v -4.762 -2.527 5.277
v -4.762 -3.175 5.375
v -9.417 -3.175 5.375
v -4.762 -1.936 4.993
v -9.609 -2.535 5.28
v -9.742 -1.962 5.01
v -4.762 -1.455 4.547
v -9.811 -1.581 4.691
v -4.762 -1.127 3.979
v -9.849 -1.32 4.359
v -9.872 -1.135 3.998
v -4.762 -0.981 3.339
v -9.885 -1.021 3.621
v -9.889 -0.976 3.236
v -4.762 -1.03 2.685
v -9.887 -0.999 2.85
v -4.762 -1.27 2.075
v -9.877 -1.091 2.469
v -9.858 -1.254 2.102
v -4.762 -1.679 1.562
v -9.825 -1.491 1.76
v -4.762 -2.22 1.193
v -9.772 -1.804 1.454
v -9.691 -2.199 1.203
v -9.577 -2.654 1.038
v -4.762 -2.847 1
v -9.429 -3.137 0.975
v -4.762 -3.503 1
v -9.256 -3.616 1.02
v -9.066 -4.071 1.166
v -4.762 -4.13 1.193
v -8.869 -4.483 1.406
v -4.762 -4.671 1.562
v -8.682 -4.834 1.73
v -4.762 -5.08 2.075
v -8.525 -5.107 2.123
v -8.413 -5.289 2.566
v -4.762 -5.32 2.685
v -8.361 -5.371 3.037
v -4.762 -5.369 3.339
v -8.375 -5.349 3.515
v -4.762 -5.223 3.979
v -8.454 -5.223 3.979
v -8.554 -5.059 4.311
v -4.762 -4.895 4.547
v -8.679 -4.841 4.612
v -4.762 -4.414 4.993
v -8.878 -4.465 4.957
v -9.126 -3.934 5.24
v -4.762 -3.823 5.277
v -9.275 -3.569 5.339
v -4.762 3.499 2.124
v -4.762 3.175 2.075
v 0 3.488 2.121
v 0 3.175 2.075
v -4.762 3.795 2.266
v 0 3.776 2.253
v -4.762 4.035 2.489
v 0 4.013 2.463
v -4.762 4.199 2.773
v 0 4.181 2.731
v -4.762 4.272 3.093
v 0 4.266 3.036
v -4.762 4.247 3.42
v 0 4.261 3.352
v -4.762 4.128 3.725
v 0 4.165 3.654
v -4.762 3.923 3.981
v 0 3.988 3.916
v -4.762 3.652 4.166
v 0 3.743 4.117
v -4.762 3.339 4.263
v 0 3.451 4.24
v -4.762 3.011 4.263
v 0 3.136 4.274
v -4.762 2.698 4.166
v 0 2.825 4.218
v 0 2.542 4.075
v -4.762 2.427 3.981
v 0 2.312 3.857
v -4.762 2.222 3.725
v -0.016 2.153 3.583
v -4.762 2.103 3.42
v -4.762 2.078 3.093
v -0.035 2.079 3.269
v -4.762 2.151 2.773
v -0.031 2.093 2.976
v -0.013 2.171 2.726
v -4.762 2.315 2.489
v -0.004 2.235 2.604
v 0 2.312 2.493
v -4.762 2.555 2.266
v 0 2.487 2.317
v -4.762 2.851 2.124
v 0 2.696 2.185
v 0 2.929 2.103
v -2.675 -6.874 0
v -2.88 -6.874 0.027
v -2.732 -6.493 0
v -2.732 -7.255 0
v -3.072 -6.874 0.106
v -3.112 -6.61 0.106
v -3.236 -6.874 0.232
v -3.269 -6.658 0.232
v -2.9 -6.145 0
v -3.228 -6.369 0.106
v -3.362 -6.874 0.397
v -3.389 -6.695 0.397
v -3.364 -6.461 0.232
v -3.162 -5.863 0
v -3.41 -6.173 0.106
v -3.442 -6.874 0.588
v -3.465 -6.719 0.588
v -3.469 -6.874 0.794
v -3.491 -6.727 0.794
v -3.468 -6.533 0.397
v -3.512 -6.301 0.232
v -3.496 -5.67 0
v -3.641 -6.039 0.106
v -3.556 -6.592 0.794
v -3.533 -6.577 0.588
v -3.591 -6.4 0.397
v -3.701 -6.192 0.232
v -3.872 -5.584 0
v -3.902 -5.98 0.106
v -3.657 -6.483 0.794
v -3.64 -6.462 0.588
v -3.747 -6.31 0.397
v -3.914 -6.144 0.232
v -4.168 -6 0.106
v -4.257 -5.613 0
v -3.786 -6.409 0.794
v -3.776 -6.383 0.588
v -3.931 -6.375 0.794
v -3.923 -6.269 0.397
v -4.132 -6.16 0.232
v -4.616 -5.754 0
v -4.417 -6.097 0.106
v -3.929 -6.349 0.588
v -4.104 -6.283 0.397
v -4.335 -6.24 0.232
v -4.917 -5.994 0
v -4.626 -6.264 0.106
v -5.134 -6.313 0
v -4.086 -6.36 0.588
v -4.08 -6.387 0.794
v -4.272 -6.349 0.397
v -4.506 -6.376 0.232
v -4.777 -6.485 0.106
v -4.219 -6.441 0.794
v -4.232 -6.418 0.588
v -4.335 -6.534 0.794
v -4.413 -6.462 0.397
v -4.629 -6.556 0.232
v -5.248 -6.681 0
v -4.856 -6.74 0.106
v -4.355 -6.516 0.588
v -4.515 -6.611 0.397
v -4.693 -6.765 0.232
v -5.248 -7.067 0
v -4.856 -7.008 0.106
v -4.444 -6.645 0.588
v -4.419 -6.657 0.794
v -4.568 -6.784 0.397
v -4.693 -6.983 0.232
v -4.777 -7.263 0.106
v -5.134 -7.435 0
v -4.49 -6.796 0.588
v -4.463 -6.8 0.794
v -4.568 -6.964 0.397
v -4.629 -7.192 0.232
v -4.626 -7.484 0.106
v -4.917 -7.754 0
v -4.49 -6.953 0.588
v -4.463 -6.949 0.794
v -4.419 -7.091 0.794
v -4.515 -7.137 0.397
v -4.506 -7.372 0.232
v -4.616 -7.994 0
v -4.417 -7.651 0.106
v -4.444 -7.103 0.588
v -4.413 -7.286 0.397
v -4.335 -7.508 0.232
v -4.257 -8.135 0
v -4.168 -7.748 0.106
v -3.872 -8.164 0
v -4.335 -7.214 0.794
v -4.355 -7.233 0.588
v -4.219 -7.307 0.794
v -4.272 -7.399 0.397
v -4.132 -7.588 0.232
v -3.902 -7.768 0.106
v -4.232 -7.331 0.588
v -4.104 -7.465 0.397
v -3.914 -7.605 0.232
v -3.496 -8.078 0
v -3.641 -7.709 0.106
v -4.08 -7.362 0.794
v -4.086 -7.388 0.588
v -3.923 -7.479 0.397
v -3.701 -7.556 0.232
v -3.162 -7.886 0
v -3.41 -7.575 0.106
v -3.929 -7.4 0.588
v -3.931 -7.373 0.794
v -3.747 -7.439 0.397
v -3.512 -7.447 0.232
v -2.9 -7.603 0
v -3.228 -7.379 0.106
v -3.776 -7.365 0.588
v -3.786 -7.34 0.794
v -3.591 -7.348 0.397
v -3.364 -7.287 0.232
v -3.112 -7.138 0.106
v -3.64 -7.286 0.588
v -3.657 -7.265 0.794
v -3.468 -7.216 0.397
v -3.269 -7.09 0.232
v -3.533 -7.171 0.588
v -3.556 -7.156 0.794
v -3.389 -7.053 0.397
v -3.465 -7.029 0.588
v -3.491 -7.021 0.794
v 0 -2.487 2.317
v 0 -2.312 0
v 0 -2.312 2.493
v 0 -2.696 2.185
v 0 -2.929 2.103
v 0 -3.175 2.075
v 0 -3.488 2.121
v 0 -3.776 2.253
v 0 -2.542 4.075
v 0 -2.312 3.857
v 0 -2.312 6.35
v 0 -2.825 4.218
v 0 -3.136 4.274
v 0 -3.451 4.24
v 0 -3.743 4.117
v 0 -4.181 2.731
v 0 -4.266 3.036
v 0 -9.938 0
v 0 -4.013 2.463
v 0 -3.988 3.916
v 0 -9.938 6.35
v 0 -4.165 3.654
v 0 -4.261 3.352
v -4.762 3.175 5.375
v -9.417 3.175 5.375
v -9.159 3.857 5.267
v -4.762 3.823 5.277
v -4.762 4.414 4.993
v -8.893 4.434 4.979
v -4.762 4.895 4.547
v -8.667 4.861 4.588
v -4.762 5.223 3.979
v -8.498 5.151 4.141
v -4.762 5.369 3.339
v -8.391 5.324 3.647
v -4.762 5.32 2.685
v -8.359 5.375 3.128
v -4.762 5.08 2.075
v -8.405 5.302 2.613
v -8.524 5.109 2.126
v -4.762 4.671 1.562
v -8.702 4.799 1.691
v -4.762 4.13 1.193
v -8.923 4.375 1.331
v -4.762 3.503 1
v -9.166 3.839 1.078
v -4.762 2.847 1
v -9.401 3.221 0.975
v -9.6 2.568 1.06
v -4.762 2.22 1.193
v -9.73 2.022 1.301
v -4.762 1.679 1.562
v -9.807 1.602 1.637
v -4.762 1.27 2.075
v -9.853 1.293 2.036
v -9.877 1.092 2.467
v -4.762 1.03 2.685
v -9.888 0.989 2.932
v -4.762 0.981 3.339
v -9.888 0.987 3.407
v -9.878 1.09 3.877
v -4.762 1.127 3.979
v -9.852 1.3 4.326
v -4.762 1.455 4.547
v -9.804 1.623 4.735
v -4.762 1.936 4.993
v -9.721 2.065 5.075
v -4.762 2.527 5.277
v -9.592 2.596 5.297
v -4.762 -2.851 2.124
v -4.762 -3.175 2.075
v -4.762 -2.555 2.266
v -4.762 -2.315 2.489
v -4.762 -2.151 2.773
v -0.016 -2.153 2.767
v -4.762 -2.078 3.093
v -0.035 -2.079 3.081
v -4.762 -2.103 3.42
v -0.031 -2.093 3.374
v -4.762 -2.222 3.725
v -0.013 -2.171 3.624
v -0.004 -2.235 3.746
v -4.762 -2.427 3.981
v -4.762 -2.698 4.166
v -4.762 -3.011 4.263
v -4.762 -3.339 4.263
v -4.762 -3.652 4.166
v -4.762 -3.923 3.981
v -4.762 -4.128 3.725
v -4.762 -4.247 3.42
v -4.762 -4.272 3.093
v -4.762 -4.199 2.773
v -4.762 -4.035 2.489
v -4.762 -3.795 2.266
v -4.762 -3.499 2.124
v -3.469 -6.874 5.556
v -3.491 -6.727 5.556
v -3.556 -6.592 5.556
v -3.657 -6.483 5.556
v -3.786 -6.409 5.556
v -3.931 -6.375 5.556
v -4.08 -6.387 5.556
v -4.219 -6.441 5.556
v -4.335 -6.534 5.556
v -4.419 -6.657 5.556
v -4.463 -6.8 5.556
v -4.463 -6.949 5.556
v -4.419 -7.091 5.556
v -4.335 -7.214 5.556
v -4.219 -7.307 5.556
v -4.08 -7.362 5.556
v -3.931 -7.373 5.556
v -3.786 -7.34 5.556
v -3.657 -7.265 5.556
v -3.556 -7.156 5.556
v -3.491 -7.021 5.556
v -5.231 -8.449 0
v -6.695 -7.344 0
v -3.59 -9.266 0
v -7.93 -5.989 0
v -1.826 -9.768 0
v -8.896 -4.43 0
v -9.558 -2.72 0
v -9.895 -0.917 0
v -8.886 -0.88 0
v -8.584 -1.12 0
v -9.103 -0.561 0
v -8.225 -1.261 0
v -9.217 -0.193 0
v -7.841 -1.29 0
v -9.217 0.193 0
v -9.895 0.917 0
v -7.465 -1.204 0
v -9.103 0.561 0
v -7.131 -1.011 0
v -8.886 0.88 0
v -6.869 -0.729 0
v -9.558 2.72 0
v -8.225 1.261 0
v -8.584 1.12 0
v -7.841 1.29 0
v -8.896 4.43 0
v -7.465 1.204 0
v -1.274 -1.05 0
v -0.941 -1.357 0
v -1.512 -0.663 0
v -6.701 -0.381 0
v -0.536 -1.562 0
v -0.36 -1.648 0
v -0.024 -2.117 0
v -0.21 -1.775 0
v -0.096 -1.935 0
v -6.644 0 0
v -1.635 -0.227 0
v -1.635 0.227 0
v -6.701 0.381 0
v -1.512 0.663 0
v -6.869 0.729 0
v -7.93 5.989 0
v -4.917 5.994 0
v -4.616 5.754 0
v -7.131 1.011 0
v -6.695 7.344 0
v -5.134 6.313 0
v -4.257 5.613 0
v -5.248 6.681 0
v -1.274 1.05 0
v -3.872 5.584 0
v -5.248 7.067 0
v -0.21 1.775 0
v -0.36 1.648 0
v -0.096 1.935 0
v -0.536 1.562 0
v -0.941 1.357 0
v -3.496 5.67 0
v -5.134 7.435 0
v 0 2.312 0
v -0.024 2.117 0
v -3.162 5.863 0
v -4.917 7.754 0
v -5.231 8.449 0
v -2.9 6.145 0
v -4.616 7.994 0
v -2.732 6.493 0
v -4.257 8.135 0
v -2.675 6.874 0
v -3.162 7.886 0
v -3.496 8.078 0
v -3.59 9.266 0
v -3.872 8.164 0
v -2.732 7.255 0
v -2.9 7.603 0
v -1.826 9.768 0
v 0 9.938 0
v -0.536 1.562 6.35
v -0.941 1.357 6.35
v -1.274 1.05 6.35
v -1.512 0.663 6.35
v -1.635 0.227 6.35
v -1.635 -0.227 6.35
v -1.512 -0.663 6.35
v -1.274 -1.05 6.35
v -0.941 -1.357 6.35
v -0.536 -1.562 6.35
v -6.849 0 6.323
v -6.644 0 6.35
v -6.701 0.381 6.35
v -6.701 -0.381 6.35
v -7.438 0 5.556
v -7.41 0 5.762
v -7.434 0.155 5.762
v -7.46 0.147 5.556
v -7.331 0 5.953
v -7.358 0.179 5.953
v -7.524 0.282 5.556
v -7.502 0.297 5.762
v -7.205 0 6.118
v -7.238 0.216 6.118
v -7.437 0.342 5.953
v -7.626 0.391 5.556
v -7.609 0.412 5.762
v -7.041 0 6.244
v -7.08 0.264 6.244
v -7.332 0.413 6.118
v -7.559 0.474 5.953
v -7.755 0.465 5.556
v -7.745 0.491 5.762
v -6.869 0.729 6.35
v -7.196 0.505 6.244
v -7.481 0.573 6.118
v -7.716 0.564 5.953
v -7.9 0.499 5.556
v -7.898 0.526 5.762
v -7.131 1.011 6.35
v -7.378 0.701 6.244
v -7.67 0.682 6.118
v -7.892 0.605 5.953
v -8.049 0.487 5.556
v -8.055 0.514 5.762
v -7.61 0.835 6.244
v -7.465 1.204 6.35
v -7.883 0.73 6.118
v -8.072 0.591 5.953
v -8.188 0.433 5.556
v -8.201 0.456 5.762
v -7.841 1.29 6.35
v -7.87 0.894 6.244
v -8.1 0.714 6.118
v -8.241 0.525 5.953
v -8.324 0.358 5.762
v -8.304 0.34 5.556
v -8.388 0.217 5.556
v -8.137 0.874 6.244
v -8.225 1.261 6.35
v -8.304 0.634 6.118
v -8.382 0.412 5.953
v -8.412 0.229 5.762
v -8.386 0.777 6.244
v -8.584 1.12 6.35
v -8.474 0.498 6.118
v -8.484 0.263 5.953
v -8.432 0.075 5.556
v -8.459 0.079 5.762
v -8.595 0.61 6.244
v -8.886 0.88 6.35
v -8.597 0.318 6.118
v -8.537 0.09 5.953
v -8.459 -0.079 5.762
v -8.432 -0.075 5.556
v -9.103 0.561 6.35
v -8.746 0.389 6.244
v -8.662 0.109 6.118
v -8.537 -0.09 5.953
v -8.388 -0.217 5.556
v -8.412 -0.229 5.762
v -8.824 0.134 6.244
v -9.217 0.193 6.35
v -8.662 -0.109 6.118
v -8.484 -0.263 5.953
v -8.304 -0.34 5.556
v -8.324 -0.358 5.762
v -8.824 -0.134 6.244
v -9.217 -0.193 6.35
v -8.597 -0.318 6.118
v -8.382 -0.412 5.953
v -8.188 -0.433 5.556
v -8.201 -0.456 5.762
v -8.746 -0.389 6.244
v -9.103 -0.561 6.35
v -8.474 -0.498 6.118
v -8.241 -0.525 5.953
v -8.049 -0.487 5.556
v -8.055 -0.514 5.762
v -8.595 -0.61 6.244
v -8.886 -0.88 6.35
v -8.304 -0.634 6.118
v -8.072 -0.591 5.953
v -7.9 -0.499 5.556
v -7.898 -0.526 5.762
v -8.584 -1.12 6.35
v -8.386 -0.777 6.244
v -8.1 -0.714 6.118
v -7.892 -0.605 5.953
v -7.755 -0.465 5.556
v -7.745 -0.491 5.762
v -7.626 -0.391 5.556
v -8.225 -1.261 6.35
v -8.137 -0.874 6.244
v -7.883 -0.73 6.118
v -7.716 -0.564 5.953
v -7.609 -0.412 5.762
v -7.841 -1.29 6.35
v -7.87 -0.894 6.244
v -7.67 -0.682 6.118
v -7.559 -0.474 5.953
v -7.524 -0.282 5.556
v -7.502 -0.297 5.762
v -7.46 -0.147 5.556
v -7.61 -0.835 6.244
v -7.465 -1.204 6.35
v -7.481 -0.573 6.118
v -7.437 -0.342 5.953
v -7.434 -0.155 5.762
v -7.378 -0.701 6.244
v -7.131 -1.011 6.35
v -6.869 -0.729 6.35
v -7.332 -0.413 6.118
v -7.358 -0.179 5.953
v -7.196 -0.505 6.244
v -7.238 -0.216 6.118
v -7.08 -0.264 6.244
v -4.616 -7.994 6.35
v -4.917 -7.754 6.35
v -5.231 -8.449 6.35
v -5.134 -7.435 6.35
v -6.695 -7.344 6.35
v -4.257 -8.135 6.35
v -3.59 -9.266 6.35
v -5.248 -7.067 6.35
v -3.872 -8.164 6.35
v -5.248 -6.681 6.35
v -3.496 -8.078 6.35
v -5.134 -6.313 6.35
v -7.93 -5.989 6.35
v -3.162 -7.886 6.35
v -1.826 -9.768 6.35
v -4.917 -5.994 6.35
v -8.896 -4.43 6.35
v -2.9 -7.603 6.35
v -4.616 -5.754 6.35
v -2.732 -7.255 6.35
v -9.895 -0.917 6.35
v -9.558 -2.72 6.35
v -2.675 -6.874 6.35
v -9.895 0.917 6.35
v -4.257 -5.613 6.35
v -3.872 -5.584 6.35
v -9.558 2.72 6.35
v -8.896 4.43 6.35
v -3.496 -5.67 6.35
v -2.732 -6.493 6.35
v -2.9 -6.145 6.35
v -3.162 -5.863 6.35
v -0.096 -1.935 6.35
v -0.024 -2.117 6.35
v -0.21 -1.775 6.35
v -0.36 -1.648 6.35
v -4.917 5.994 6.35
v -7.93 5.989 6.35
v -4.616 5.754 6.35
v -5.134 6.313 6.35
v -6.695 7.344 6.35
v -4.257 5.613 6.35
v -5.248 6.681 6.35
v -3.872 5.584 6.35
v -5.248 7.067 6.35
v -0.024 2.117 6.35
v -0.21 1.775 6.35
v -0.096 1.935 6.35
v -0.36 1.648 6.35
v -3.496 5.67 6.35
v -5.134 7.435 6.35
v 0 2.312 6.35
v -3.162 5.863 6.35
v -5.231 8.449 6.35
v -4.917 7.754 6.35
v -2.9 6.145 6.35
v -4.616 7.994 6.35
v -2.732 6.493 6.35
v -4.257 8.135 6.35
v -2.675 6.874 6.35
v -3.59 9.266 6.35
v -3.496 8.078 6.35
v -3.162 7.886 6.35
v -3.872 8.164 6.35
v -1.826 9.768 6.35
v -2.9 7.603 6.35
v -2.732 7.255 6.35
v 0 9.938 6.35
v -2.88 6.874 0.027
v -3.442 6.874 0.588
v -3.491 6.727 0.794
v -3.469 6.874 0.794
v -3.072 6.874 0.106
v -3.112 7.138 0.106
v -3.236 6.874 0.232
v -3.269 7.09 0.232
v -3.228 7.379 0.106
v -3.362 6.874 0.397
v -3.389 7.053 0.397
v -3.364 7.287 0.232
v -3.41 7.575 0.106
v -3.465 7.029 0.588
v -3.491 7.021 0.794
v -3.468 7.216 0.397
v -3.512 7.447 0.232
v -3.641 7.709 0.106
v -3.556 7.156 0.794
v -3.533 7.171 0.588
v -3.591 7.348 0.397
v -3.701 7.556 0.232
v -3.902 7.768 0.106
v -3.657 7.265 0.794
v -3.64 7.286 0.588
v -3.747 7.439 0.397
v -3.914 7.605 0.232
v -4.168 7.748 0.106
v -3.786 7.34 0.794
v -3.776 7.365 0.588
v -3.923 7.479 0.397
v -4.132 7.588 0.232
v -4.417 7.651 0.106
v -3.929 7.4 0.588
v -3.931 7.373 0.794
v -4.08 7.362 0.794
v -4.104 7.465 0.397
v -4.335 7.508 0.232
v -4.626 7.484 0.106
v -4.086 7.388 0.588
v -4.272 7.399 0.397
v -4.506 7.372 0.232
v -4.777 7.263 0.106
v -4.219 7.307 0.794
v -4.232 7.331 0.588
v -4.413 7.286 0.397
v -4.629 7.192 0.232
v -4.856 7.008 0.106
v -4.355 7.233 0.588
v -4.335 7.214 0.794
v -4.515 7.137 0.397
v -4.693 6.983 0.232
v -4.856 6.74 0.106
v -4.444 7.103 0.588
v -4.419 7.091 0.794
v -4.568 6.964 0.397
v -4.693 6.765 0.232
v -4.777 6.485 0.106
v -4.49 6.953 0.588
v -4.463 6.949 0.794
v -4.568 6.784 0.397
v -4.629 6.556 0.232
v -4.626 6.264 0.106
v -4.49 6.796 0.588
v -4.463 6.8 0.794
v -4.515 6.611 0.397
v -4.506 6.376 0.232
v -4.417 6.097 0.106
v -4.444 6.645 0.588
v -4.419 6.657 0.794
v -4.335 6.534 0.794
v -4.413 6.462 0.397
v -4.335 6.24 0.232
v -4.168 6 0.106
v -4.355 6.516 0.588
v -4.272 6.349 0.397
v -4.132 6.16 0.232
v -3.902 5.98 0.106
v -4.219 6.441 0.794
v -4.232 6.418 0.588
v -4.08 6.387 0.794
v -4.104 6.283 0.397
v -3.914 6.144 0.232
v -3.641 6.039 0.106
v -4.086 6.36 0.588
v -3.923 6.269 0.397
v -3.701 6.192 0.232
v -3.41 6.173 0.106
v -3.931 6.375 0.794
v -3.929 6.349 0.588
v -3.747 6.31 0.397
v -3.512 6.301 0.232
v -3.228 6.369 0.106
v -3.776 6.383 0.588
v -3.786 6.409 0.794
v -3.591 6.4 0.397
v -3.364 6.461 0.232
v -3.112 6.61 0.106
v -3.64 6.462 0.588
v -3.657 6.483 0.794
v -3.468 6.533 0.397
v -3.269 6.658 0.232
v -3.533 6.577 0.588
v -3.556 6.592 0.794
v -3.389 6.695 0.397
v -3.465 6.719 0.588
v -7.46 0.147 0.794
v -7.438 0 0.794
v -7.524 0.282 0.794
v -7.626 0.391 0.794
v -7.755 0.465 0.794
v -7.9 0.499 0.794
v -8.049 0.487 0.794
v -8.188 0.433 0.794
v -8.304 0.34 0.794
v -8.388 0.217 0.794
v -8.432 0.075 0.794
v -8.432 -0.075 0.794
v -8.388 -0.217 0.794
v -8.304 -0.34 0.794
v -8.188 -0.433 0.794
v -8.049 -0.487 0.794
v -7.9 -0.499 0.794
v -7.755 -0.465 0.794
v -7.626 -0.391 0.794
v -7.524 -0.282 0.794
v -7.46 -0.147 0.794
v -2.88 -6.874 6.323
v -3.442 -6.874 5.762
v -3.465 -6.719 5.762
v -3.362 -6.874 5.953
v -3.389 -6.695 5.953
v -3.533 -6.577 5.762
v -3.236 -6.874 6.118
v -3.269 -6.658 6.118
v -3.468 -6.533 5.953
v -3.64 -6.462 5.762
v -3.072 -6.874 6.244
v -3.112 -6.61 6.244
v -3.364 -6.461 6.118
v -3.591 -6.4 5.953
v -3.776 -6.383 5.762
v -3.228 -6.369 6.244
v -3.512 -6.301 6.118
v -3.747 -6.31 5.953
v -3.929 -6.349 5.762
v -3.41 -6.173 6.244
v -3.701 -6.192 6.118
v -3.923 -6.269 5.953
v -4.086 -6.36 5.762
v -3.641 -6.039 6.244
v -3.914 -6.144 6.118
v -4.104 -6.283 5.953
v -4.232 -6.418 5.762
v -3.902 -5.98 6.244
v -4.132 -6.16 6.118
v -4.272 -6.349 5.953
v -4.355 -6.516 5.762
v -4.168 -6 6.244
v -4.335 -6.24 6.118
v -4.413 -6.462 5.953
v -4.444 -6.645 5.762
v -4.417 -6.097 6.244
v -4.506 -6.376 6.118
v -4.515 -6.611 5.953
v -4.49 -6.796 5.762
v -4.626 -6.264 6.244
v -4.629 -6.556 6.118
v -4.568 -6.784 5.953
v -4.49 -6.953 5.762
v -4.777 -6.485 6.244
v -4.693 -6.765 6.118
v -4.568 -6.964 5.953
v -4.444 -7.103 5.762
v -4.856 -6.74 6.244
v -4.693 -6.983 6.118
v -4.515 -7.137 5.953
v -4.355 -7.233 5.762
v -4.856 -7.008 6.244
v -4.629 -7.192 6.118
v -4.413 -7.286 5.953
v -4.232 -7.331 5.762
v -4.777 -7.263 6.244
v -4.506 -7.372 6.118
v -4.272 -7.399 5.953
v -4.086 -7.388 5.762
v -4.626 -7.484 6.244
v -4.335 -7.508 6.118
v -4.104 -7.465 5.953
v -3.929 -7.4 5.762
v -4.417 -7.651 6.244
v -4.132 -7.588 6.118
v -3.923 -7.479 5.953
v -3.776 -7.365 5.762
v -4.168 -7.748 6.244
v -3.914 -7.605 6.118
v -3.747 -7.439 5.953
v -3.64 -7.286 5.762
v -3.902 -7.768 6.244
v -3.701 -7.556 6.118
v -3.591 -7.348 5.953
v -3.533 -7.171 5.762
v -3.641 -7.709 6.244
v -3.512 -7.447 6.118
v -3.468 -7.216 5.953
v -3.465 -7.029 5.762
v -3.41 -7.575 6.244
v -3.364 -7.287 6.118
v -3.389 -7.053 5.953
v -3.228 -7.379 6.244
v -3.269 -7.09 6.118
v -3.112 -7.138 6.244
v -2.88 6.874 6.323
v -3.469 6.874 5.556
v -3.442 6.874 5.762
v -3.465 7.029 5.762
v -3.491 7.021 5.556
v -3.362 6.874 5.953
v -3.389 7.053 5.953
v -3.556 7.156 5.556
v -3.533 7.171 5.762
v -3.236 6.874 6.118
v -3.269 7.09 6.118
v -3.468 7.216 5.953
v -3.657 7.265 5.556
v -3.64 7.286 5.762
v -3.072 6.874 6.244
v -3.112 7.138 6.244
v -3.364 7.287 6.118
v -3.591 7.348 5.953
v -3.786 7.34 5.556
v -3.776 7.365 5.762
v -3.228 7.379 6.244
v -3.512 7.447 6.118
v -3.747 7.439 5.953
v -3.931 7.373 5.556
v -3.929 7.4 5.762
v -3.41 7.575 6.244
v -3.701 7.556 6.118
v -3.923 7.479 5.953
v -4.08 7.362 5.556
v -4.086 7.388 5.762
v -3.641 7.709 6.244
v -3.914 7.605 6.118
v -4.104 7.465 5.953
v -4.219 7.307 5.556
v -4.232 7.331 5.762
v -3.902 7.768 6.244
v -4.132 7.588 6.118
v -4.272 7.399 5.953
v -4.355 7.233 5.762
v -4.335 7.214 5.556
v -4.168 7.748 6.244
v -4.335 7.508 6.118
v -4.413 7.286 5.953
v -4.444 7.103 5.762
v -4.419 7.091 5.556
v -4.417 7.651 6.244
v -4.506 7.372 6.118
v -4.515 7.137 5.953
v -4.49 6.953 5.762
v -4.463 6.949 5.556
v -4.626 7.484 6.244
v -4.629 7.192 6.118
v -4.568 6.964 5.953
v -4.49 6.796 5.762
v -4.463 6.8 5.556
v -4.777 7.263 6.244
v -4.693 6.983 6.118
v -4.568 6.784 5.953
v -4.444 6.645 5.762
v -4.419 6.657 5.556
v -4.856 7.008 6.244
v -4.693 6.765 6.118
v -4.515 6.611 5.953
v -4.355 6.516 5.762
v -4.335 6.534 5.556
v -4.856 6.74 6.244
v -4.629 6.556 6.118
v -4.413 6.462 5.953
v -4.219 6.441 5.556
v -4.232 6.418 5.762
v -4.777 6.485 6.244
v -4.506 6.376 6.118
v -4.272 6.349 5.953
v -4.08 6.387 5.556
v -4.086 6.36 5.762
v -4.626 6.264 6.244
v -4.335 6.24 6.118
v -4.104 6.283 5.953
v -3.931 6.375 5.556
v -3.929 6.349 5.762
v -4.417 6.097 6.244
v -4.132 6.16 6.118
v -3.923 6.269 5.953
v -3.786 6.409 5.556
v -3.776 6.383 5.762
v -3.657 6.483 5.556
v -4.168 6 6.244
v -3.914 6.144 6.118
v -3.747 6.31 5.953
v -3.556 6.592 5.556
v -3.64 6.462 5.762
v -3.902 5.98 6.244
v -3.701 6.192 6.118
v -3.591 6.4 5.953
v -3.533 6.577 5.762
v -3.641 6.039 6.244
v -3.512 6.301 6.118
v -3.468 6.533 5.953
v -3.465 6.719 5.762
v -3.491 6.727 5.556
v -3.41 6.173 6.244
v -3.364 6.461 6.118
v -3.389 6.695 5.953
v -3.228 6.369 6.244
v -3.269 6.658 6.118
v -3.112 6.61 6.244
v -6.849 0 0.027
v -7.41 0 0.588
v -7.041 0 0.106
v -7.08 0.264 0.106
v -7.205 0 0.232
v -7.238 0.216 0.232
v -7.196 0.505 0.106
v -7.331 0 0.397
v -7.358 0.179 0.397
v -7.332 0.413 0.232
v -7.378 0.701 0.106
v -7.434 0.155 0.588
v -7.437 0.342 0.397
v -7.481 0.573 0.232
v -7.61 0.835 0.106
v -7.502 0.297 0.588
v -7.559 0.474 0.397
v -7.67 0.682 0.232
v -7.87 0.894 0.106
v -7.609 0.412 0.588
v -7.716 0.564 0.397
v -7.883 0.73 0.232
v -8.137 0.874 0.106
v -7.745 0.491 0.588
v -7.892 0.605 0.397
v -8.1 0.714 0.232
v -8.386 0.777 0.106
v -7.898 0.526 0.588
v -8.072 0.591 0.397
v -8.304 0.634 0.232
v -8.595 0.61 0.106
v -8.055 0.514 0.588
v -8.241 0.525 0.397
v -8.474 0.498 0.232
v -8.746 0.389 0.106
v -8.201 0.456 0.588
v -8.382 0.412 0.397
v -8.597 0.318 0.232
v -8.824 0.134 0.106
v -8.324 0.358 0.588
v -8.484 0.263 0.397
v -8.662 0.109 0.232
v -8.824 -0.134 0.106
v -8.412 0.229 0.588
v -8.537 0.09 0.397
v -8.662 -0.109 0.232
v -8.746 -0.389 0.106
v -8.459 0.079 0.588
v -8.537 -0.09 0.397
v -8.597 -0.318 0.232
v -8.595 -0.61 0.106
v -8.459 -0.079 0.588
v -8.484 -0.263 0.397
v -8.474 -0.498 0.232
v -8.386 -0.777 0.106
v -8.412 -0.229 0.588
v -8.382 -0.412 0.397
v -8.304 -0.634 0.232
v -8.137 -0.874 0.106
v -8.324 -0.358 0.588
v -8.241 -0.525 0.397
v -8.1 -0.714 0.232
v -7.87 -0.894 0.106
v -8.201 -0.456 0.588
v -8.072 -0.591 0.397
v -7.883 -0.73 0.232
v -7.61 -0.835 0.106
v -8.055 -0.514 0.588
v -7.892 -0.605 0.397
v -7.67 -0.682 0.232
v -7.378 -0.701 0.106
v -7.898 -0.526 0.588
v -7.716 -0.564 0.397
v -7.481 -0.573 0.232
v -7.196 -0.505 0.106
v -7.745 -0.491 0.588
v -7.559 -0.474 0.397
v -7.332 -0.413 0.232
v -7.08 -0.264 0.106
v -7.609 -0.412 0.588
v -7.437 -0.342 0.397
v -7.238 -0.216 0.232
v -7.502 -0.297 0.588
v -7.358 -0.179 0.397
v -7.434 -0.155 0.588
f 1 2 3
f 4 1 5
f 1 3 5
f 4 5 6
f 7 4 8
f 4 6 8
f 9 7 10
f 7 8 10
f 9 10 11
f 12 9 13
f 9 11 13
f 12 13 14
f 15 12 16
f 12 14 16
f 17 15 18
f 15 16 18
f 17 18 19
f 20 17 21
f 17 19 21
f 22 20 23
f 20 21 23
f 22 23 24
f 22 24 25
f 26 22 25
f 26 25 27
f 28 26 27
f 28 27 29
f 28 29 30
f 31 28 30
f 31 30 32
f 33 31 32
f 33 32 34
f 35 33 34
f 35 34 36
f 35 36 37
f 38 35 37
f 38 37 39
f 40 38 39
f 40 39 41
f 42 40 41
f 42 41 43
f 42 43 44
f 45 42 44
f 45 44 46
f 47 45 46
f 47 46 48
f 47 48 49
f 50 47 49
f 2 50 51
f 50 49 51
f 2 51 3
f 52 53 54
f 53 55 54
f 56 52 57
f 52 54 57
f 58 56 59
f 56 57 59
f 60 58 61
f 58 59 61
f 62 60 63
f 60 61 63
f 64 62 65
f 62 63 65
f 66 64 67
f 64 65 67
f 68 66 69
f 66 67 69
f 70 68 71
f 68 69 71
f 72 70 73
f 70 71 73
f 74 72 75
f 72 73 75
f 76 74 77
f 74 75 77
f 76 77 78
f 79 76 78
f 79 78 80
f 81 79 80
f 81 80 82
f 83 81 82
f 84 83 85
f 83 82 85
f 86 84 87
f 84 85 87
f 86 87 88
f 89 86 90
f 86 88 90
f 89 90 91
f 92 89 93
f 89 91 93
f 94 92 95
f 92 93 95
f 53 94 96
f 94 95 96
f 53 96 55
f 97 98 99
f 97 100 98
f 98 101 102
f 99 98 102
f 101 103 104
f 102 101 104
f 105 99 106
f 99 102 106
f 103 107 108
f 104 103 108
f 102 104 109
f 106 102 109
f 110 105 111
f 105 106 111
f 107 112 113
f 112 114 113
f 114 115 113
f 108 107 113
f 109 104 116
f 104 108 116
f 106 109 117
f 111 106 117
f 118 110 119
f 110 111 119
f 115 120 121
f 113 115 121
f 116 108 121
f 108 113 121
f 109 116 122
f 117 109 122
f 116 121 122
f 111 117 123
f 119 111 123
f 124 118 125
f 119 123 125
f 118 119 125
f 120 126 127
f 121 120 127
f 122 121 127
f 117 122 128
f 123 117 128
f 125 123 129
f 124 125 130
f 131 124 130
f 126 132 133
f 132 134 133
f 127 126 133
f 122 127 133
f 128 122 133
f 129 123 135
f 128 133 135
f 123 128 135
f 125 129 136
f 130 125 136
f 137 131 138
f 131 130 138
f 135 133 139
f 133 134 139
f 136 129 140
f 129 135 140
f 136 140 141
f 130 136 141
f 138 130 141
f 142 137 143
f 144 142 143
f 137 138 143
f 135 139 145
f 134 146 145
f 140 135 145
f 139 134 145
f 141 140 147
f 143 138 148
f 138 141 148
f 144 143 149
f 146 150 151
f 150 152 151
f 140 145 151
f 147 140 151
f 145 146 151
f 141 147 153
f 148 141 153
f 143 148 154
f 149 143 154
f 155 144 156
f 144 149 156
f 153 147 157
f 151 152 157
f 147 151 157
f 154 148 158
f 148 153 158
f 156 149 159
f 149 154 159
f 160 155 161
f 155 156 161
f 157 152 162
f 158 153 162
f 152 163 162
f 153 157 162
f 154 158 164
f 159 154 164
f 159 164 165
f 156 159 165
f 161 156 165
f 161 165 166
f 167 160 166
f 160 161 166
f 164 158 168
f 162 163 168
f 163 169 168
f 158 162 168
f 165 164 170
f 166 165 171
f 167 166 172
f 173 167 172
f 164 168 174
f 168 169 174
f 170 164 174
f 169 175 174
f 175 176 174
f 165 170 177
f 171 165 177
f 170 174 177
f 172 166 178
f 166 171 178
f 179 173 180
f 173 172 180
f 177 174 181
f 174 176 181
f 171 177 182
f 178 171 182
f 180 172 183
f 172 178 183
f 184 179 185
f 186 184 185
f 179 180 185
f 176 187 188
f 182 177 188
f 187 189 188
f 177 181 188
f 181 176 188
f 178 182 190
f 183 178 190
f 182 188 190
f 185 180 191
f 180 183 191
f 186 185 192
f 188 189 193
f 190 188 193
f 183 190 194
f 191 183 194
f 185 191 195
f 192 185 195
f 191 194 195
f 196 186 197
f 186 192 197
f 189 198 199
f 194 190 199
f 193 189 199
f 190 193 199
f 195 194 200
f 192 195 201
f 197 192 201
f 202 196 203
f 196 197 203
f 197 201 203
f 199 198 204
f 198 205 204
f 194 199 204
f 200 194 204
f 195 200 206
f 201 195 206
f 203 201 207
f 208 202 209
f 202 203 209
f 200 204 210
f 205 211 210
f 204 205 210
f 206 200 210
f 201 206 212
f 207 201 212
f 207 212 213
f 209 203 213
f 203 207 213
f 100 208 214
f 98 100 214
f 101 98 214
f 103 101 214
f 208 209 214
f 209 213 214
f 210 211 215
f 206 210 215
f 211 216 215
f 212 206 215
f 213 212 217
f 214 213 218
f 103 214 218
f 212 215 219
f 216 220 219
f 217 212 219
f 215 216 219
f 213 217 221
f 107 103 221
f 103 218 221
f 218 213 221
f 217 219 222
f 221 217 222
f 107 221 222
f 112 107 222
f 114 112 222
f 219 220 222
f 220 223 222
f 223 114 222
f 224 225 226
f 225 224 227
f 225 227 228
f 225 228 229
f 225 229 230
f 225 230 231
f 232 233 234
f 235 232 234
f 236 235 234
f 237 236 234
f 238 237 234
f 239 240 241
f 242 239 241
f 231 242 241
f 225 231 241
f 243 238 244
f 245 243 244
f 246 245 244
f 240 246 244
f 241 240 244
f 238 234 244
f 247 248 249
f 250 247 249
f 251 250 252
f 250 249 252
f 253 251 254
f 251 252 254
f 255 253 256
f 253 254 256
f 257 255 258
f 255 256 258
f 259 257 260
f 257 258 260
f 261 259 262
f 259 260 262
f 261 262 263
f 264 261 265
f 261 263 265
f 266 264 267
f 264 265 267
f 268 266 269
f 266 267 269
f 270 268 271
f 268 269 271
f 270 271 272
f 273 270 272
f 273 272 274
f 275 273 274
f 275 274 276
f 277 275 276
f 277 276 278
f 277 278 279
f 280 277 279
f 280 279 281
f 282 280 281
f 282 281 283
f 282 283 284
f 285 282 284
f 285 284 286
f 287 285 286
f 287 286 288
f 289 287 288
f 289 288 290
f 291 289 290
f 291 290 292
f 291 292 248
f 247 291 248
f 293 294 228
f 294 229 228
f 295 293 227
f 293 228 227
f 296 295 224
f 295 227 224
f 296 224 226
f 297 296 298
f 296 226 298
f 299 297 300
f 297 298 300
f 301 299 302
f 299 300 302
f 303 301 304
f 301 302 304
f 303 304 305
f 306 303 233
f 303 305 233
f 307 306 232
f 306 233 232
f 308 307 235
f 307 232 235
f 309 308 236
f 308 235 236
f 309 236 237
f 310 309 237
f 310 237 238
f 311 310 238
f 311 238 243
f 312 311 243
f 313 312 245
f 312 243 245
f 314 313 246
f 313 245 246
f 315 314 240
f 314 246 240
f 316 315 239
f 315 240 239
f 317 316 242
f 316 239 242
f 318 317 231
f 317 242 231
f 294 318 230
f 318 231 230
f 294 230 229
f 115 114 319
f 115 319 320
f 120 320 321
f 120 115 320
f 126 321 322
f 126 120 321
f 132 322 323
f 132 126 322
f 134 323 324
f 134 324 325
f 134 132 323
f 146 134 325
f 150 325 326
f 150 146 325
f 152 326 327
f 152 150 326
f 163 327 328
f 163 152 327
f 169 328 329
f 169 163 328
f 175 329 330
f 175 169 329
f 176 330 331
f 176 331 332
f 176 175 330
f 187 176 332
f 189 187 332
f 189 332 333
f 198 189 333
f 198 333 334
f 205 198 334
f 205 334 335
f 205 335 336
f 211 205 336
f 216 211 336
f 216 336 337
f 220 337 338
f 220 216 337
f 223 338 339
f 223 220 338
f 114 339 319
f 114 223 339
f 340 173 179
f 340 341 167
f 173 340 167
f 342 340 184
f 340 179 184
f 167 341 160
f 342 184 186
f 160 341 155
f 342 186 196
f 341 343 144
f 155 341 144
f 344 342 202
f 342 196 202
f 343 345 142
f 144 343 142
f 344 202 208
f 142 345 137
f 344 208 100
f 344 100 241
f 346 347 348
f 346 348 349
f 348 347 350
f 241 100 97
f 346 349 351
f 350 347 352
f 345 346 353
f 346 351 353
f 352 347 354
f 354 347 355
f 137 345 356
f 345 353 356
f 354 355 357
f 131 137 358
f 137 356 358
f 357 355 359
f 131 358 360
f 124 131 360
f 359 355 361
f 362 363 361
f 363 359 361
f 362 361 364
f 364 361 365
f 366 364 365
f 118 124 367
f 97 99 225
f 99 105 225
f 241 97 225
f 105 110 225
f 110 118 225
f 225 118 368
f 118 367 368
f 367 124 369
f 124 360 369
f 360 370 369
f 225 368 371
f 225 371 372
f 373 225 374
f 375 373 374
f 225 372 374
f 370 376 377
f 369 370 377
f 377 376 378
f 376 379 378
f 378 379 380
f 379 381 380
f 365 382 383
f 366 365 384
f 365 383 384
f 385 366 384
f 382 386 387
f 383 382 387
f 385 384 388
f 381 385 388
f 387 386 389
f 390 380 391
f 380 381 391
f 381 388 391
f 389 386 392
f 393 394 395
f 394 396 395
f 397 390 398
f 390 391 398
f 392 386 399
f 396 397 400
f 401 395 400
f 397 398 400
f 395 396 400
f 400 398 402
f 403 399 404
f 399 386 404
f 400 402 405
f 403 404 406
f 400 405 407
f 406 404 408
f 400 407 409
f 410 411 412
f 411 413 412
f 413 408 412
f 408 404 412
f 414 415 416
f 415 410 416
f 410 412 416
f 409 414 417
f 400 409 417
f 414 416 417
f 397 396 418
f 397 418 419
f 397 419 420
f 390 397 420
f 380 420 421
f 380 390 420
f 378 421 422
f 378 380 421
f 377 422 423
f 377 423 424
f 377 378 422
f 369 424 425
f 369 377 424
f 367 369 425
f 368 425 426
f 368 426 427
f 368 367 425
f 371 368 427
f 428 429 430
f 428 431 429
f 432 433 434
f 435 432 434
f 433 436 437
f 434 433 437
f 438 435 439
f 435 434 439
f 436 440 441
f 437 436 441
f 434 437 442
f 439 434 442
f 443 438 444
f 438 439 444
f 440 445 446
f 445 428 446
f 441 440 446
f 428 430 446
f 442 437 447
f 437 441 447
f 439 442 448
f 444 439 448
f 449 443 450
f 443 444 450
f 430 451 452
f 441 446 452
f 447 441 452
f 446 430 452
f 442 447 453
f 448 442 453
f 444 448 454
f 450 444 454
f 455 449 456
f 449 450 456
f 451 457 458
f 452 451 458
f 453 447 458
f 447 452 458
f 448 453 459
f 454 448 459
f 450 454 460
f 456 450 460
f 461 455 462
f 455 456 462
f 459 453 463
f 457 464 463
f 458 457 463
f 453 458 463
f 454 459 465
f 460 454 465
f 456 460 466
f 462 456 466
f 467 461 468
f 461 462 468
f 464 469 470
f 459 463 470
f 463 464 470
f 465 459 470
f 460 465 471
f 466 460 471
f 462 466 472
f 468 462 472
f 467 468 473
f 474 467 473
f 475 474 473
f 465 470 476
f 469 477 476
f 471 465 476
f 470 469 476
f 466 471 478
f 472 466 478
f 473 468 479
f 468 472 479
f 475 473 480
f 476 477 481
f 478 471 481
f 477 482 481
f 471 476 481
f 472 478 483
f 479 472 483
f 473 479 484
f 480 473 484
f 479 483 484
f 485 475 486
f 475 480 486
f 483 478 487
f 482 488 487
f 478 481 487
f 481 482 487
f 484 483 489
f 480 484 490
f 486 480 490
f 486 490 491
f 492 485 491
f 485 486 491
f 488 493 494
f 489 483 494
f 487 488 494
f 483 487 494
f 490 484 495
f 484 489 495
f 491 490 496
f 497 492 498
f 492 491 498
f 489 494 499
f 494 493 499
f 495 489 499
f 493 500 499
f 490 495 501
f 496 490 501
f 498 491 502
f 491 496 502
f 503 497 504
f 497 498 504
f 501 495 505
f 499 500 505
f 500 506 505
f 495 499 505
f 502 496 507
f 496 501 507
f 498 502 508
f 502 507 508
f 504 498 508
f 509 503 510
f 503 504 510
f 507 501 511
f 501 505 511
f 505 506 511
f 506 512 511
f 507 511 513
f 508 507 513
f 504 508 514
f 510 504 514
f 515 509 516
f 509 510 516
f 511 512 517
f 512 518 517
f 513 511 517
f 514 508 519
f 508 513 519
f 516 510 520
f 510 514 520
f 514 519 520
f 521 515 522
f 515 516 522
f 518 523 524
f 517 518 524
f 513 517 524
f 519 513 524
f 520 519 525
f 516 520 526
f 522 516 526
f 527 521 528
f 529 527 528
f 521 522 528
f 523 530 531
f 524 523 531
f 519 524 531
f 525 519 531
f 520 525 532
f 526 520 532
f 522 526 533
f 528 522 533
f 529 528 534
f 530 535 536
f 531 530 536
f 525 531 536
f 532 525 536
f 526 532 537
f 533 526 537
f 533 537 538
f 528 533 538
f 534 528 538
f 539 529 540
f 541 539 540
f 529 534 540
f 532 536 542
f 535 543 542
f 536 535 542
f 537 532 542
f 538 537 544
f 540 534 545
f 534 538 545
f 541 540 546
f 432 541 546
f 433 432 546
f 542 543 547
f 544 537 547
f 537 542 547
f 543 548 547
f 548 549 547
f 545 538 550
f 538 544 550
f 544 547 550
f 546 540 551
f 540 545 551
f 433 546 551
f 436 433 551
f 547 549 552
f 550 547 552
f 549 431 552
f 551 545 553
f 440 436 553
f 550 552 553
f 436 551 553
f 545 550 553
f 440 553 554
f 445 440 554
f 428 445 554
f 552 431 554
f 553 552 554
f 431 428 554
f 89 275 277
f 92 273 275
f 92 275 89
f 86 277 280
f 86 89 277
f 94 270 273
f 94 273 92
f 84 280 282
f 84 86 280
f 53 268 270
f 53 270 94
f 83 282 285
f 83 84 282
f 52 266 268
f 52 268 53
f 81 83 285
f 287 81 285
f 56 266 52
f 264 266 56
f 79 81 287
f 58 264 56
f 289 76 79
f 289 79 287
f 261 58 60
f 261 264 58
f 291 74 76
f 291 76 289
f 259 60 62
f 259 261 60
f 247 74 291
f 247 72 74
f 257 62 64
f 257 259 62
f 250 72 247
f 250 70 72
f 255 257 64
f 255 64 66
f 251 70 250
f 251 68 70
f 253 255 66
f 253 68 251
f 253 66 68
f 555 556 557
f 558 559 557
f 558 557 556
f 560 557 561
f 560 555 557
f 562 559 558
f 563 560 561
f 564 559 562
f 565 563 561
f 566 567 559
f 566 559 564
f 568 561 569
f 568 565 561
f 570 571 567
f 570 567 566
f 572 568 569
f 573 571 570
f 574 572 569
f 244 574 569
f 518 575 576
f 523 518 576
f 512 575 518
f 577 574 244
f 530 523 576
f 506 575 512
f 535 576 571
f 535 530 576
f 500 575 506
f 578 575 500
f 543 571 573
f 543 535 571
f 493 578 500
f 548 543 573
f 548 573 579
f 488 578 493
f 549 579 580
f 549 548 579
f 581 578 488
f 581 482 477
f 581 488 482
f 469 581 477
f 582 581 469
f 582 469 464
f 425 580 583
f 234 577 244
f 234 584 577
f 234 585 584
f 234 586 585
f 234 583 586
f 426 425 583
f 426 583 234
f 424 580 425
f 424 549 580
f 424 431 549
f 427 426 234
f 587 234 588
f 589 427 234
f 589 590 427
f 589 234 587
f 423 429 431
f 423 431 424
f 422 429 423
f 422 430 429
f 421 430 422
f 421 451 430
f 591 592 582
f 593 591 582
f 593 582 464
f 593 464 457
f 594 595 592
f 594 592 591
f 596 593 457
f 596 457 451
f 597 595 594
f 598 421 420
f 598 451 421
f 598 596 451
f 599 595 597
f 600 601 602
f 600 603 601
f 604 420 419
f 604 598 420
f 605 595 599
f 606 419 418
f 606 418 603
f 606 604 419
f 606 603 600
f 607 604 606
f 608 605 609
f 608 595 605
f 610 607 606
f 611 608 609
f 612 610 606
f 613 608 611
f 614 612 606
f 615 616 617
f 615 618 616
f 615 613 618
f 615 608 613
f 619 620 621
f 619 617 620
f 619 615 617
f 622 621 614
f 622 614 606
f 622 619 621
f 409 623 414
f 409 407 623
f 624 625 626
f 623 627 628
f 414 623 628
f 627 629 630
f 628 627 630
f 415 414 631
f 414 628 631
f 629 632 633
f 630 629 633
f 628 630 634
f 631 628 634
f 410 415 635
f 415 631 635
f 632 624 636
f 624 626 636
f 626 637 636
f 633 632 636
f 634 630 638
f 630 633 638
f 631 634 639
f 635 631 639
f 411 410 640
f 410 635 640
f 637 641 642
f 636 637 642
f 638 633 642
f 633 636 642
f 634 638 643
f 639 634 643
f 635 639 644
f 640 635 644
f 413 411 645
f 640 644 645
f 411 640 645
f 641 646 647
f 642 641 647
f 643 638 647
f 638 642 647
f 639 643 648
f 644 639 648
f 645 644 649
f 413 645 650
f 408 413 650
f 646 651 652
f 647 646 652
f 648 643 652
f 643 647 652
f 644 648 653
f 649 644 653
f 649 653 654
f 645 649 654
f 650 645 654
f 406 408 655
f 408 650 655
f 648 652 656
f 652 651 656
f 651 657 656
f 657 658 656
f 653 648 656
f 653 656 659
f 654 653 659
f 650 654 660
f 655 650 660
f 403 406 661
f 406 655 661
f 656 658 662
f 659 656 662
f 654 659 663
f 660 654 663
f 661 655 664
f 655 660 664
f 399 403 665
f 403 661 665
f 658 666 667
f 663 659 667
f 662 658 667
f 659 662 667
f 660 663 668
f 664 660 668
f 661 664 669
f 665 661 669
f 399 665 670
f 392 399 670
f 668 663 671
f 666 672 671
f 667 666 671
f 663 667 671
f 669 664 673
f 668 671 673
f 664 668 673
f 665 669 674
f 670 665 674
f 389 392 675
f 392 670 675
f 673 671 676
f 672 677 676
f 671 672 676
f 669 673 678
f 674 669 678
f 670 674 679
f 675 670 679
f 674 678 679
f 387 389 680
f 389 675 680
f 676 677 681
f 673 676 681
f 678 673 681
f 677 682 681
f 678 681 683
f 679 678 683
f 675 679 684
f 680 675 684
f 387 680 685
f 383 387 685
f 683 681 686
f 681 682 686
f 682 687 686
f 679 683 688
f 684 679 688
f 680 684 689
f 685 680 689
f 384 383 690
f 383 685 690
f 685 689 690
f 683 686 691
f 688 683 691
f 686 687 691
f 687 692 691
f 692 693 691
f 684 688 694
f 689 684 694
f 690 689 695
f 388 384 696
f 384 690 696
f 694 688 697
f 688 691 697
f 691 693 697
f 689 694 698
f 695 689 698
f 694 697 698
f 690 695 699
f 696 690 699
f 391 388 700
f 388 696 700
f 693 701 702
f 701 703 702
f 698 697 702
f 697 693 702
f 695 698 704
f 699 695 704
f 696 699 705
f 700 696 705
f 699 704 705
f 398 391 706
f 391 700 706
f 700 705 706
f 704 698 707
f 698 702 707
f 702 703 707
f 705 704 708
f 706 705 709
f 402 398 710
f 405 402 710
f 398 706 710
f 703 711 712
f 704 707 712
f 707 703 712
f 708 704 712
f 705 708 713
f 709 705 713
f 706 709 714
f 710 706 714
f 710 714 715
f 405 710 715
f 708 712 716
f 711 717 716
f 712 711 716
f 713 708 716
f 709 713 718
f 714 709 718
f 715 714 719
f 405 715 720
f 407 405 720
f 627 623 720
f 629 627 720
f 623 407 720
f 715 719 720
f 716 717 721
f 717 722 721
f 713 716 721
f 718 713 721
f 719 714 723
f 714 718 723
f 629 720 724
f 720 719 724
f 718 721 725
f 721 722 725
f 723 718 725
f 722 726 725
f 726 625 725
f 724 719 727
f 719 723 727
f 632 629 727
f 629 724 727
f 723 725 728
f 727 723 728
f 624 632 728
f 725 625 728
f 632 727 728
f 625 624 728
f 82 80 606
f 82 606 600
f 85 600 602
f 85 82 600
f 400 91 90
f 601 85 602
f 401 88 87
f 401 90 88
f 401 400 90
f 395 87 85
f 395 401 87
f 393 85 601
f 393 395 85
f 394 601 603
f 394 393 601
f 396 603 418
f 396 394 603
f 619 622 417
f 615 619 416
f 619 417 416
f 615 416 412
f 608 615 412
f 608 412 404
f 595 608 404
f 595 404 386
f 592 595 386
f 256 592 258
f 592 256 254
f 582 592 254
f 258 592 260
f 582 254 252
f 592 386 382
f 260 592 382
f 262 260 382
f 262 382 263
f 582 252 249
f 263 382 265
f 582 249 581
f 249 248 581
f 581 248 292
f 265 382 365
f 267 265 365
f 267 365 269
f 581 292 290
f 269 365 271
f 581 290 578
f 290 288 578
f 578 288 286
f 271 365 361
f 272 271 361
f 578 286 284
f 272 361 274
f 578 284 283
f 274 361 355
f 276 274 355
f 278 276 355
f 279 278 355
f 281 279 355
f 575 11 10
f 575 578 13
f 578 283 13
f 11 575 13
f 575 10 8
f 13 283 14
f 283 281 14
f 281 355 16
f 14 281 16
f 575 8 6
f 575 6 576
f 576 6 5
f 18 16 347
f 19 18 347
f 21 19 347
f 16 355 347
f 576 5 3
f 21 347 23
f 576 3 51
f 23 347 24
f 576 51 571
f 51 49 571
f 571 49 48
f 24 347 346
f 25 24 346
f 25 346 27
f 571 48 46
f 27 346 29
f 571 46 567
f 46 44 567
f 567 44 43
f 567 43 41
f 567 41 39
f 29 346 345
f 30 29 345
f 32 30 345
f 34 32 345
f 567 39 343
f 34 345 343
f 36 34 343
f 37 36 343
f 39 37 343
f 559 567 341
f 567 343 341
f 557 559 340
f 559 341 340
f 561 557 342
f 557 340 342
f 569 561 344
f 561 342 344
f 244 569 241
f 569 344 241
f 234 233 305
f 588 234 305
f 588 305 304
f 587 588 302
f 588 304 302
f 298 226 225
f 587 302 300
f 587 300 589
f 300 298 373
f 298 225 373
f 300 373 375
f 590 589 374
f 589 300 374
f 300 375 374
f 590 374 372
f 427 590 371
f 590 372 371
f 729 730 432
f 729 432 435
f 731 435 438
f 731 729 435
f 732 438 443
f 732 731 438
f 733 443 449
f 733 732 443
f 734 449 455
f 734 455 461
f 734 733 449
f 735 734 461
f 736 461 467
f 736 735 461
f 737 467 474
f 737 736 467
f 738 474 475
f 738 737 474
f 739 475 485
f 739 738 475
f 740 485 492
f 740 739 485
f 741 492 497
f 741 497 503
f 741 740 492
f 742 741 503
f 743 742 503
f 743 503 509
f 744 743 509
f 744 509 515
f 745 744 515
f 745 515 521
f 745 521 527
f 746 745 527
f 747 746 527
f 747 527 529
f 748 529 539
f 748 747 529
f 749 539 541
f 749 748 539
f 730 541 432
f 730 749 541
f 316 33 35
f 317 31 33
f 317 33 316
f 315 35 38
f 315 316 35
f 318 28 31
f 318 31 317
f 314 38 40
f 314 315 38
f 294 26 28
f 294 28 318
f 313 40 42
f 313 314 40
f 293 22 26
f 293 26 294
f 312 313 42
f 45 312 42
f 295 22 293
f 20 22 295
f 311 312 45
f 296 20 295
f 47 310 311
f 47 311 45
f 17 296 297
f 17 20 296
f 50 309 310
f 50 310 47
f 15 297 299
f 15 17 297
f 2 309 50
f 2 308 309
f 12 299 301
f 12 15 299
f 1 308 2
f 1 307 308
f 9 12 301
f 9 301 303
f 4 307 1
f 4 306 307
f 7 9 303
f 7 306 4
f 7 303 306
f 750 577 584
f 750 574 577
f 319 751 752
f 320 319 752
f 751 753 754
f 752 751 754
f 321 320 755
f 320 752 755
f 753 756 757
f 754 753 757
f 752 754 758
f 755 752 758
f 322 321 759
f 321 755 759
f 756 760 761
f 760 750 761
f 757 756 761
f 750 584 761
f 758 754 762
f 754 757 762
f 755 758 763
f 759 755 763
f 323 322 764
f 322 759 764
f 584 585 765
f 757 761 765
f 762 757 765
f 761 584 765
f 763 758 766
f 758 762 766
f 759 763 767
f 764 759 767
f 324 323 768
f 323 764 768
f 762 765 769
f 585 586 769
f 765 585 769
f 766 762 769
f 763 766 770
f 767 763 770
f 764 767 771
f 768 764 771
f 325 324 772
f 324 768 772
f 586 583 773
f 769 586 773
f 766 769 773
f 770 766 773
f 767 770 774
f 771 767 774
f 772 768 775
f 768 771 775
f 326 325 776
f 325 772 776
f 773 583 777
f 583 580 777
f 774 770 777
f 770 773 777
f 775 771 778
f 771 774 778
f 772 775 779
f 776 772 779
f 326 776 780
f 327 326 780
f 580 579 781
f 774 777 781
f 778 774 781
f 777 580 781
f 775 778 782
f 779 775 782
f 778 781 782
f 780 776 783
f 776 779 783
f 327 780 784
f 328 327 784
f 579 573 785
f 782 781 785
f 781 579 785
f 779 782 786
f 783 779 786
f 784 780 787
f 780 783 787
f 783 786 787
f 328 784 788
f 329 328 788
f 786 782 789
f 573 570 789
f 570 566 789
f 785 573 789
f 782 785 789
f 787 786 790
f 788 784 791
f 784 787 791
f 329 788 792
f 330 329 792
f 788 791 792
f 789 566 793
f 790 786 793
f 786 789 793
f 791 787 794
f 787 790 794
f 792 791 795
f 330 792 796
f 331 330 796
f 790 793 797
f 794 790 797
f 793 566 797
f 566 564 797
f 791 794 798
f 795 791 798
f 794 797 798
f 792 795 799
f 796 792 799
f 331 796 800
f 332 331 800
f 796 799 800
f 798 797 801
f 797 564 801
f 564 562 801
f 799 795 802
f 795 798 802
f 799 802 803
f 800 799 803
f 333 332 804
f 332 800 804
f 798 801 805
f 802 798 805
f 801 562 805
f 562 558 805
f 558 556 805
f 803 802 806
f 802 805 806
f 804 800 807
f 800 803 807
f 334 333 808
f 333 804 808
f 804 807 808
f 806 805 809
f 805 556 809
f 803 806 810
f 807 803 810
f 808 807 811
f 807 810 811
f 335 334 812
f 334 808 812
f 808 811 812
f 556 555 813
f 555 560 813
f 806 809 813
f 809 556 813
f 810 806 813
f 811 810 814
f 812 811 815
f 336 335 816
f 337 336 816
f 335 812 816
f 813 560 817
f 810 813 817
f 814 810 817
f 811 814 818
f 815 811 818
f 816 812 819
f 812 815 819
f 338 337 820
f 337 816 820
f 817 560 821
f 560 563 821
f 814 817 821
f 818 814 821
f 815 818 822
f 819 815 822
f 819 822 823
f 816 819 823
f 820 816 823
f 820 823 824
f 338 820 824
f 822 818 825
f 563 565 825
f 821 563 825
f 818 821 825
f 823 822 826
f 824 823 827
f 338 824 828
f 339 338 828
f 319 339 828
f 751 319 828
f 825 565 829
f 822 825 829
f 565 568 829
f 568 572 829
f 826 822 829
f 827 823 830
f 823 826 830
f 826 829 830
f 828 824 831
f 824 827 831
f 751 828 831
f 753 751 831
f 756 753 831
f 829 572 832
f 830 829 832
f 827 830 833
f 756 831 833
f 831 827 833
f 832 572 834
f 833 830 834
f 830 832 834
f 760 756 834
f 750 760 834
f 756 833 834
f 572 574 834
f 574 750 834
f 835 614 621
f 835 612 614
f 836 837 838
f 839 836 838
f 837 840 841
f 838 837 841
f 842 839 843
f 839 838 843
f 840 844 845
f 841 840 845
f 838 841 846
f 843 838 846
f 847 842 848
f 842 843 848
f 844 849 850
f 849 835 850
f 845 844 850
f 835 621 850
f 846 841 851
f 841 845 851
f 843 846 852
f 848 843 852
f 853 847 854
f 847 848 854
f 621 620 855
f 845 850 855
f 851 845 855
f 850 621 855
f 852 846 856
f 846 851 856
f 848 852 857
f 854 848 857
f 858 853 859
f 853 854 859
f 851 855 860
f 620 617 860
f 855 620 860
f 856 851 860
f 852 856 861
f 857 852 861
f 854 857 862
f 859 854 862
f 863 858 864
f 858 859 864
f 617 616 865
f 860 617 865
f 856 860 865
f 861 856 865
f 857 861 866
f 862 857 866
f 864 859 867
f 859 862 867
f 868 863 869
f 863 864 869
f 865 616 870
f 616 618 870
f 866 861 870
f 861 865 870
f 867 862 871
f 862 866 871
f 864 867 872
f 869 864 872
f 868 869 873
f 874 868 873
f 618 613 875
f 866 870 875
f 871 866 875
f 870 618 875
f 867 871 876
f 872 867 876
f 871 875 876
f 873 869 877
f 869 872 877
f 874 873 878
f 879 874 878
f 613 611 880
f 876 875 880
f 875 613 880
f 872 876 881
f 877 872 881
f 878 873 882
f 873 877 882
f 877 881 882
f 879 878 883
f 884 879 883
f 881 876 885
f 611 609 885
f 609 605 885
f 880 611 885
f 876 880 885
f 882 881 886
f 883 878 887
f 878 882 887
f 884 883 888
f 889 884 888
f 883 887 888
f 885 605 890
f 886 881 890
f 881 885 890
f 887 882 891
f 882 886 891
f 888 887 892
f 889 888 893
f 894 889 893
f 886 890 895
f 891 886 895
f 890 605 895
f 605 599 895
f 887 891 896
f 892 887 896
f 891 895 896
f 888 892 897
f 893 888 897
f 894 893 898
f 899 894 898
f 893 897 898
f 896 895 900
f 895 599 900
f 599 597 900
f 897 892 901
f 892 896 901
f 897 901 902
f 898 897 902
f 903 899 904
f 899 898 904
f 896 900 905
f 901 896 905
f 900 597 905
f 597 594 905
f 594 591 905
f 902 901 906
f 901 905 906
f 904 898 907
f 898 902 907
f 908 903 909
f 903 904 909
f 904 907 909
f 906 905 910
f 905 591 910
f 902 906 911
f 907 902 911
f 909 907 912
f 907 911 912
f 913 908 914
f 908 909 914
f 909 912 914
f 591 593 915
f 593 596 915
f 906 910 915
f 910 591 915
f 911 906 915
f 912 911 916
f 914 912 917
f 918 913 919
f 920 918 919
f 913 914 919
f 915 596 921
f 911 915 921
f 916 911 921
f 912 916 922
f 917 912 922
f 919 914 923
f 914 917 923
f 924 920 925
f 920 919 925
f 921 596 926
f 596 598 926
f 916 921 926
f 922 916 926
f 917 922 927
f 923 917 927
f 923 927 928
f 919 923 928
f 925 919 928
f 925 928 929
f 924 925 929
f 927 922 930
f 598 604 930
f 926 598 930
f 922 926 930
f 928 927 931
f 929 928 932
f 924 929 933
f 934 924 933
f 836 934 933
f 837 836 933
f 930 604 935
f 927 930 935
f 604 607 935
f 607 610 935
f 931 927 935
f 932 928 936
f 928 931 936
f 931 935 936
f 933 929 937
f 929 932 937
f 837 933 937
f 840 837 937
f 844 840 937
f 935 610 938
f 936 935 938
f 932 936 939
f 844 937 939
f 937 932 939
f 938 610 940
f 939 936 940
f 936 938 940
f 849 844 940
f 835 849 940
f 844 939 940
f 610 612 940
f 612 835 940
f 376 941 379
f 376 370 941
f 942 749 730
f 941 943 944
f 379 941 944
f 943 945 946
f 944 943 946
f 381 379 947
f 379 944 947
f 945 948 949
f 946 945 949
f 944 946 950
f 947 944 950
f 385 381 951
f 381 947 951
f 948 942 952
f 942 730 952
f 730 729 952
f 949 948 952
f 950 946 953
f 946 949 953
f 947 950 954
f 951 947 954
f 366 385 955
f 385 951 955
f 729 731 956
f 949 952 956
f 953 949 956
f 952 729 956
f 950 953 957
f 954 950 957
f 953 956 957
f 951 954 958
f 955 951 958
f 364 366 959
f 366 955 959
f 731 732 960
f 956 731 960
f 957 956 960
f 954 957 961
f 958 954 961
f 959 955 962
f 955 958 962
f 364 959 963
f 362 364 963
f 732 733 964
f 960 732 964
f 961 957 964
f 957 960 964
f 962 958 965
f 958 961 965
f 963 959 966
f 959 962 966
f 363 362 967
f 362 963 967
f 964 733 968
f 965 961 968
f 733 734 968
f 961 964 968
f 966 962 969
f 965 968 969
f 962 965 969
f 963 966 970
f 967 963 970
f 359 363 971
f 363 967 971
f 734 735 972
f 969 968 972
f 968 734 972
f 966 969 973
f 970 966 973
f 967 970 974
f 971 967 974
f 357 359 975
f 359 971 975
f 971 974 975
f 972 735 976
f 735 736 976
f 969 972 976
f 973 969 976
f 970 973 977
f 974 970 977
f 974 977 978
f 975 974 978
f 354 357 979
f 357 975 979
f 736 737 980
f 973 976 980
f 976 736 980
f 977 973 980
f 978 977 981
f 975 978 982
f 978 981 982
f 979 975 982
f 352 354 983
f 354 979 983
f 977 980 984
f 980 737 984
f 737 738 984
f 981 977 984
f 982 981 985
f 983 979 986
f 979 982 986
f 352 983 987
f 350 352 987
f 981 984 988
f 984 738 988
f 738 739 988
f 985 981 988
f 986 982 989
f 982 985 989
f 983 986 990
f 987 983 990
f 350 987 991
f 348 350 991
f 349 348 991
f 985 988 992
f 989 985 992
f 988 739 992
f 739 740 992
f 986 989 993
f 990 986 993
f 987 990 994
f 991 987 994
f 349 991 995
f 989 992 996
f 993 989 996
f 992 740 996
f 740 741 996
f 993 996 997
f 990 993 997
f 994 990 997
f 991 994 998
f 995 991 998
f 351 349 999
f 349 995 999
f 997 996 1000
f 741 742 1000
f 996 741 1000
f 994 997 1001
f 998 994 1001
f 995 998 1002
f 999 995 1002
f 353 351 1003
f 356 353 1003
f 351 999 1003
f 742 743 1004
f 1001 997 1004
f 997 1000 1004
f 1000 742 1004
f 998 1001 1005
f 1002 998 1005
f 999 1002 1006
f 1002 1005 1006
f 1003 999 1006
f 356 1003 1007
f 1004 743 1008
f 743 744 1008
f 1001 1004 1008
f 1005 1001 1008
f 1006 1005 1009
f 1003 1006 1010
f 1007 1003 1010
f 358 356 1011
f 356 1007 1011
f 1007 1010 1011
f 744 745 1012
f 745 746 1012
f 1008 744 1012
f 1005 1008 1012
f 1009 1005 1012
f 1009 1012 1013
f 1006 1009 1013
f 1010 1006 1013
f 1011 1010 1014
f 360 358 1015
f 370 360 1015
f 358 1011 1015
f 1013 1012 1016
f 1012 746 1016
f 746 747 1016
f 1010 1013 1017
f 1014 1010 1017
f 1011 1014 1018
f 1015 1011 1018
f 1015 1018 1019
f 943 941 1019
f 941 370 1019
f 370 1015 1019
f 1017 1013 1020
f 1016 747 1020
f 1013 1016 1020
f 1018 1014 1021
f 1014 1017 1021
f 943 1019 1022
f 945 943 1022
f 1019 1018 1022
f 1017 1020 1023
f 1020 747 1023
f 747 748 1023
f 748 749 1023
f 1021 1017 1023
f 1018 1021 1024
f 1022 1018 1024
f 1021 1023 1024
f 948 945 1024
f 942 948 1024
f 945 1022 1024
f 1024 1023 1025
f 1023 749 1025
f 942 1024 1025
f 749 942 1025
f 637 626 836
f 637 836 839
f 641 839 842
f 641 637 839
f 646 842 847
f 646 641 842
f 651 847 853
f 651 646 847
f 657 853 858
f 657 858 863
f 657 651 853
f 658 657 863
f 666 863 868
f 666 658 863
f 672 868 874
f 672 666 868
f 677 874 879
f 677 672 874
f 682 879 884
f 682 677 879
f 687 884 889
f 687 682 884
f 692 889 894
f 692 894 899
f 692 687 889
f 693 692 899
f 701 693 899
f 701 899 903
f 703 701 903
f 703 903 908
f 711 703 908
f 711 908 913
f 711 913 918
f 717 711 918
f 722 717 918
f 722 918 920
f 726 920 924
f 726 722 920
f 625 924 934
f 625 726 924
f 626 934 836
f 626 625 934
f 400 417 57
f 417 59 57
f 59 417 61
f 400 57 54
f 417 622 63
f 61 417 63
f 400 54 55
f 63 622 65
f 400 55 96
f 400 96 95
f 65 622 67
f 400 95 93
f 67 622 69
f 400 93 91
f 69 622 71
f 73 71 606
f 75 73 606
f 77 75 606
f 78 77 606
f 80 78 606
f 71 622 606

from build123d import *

# Parameters (mm, degrees)
SKETCH1_R                      = 9.9375
SKETCH1_R_2                    = 1.651
SKETCH1_R_3                    = 0.5
BOSS_EXTRUDE1_DEPTH            = 6.35
CUT_EXTRUDE1_DEPTH             = 16.421748036
FILLET1_R                      = 0.79375
FILLET2_R                      = 0.79375
CBORE_FOR_M2_SHCS1_D           = 2.2
CBORE_FOR_M2_SHCS1_CBORE_D     = 4.4
CBORE_FOR_M2_SHCS1_CBORE_DEPTH = 5.175


with BuildPart() as part:
    # Sketch1 → Boss-Extrude1 (new body)
    with BuildSketch(Plane.XY):
        Circle(SKETCH1_R)
        Circle(SKETCH1_R_2, mode=Mode.SUBTRACT)
        with Locations((-7.9375, 0)):
            Circle(SKETCH1_R_3, mode=Mode.SUBTRACT)
        with Locations((-3.96875, 6.874076643)):
            Circle(SKETCH1_R_3, mode=Mode.SUBTRACT)
        with Locations((3.96875, 6.874076643)):
            Circle(SKETCH1_R_3, mode=Mode.SUBTRACT)
        with Locations((7.9375, 0)):
            Circle(SKETCH1_R_3, mode=Mode.SUBTRACT)
        with Locations((3.96875, -6.874076643)):
            Circle(SKETCH1_R_3, mode=Mode.SUBTRACT)
        with Locations((-3.96875, -6.874076643)):
            Circle(SKETCH1_R_3, mode=Mode.SUBTRACT)
    extrude(amount=BOSS_EXTRUDE1_DEPTH)

    # Sketch2 → Cut-Extrude1 (cut, through all)
    with BuildSketch(Plane.XY.offset(6.35)):
        Polygon((0, 0), (0, 25.4), (50.8, 25.4), (50.8, -25.4), (0, -25.4), align=None)
    extrude(amount=-CUT_EXTRUDE1_DEPTH, mode=Mode.SUBTRACT)

    # Fillet1
    fillet1_edges = [part.edges().sort_by_distance(p)[0] for p in [
        (0, -1.651, 3.175),
        (0, 1.651, 3.175),
    ]]
    fillet(fillet1_edges, radius=FILLET1_R)

    # Fillet2
    fillet2_edges = [part.edges().sort_by_distance(p)[0] for p in [
        (-4.46875, 6.874076643, 0),
        (-4.46875, 6.874076643, 6.35),
        (-4.46875, -6.874076643, 0),
        (-4.46875, -6.874076643, 6.35),
        (-8.4375, 0, 0),
        (-8.4375, 0, 6.35),
    ]]
    fillet(fillet2_edges, radius=FILLET2_R)

    # CBORE for M2 SHCS1 (through all)
    with Locations(Plane.ZY.offset(9.9375)):
        with Locations((3.175, 3.175), (3.175, -3.175)):
            CounterBoreHole(CBORE_FOR_M2_SHCS1_D / 2, CBORE_FOR_M2_SHCS1_CBORE_D / 2, CBORE_FOR_M2_SHCS1_CBORE_DEPTH)


solid = part.part
